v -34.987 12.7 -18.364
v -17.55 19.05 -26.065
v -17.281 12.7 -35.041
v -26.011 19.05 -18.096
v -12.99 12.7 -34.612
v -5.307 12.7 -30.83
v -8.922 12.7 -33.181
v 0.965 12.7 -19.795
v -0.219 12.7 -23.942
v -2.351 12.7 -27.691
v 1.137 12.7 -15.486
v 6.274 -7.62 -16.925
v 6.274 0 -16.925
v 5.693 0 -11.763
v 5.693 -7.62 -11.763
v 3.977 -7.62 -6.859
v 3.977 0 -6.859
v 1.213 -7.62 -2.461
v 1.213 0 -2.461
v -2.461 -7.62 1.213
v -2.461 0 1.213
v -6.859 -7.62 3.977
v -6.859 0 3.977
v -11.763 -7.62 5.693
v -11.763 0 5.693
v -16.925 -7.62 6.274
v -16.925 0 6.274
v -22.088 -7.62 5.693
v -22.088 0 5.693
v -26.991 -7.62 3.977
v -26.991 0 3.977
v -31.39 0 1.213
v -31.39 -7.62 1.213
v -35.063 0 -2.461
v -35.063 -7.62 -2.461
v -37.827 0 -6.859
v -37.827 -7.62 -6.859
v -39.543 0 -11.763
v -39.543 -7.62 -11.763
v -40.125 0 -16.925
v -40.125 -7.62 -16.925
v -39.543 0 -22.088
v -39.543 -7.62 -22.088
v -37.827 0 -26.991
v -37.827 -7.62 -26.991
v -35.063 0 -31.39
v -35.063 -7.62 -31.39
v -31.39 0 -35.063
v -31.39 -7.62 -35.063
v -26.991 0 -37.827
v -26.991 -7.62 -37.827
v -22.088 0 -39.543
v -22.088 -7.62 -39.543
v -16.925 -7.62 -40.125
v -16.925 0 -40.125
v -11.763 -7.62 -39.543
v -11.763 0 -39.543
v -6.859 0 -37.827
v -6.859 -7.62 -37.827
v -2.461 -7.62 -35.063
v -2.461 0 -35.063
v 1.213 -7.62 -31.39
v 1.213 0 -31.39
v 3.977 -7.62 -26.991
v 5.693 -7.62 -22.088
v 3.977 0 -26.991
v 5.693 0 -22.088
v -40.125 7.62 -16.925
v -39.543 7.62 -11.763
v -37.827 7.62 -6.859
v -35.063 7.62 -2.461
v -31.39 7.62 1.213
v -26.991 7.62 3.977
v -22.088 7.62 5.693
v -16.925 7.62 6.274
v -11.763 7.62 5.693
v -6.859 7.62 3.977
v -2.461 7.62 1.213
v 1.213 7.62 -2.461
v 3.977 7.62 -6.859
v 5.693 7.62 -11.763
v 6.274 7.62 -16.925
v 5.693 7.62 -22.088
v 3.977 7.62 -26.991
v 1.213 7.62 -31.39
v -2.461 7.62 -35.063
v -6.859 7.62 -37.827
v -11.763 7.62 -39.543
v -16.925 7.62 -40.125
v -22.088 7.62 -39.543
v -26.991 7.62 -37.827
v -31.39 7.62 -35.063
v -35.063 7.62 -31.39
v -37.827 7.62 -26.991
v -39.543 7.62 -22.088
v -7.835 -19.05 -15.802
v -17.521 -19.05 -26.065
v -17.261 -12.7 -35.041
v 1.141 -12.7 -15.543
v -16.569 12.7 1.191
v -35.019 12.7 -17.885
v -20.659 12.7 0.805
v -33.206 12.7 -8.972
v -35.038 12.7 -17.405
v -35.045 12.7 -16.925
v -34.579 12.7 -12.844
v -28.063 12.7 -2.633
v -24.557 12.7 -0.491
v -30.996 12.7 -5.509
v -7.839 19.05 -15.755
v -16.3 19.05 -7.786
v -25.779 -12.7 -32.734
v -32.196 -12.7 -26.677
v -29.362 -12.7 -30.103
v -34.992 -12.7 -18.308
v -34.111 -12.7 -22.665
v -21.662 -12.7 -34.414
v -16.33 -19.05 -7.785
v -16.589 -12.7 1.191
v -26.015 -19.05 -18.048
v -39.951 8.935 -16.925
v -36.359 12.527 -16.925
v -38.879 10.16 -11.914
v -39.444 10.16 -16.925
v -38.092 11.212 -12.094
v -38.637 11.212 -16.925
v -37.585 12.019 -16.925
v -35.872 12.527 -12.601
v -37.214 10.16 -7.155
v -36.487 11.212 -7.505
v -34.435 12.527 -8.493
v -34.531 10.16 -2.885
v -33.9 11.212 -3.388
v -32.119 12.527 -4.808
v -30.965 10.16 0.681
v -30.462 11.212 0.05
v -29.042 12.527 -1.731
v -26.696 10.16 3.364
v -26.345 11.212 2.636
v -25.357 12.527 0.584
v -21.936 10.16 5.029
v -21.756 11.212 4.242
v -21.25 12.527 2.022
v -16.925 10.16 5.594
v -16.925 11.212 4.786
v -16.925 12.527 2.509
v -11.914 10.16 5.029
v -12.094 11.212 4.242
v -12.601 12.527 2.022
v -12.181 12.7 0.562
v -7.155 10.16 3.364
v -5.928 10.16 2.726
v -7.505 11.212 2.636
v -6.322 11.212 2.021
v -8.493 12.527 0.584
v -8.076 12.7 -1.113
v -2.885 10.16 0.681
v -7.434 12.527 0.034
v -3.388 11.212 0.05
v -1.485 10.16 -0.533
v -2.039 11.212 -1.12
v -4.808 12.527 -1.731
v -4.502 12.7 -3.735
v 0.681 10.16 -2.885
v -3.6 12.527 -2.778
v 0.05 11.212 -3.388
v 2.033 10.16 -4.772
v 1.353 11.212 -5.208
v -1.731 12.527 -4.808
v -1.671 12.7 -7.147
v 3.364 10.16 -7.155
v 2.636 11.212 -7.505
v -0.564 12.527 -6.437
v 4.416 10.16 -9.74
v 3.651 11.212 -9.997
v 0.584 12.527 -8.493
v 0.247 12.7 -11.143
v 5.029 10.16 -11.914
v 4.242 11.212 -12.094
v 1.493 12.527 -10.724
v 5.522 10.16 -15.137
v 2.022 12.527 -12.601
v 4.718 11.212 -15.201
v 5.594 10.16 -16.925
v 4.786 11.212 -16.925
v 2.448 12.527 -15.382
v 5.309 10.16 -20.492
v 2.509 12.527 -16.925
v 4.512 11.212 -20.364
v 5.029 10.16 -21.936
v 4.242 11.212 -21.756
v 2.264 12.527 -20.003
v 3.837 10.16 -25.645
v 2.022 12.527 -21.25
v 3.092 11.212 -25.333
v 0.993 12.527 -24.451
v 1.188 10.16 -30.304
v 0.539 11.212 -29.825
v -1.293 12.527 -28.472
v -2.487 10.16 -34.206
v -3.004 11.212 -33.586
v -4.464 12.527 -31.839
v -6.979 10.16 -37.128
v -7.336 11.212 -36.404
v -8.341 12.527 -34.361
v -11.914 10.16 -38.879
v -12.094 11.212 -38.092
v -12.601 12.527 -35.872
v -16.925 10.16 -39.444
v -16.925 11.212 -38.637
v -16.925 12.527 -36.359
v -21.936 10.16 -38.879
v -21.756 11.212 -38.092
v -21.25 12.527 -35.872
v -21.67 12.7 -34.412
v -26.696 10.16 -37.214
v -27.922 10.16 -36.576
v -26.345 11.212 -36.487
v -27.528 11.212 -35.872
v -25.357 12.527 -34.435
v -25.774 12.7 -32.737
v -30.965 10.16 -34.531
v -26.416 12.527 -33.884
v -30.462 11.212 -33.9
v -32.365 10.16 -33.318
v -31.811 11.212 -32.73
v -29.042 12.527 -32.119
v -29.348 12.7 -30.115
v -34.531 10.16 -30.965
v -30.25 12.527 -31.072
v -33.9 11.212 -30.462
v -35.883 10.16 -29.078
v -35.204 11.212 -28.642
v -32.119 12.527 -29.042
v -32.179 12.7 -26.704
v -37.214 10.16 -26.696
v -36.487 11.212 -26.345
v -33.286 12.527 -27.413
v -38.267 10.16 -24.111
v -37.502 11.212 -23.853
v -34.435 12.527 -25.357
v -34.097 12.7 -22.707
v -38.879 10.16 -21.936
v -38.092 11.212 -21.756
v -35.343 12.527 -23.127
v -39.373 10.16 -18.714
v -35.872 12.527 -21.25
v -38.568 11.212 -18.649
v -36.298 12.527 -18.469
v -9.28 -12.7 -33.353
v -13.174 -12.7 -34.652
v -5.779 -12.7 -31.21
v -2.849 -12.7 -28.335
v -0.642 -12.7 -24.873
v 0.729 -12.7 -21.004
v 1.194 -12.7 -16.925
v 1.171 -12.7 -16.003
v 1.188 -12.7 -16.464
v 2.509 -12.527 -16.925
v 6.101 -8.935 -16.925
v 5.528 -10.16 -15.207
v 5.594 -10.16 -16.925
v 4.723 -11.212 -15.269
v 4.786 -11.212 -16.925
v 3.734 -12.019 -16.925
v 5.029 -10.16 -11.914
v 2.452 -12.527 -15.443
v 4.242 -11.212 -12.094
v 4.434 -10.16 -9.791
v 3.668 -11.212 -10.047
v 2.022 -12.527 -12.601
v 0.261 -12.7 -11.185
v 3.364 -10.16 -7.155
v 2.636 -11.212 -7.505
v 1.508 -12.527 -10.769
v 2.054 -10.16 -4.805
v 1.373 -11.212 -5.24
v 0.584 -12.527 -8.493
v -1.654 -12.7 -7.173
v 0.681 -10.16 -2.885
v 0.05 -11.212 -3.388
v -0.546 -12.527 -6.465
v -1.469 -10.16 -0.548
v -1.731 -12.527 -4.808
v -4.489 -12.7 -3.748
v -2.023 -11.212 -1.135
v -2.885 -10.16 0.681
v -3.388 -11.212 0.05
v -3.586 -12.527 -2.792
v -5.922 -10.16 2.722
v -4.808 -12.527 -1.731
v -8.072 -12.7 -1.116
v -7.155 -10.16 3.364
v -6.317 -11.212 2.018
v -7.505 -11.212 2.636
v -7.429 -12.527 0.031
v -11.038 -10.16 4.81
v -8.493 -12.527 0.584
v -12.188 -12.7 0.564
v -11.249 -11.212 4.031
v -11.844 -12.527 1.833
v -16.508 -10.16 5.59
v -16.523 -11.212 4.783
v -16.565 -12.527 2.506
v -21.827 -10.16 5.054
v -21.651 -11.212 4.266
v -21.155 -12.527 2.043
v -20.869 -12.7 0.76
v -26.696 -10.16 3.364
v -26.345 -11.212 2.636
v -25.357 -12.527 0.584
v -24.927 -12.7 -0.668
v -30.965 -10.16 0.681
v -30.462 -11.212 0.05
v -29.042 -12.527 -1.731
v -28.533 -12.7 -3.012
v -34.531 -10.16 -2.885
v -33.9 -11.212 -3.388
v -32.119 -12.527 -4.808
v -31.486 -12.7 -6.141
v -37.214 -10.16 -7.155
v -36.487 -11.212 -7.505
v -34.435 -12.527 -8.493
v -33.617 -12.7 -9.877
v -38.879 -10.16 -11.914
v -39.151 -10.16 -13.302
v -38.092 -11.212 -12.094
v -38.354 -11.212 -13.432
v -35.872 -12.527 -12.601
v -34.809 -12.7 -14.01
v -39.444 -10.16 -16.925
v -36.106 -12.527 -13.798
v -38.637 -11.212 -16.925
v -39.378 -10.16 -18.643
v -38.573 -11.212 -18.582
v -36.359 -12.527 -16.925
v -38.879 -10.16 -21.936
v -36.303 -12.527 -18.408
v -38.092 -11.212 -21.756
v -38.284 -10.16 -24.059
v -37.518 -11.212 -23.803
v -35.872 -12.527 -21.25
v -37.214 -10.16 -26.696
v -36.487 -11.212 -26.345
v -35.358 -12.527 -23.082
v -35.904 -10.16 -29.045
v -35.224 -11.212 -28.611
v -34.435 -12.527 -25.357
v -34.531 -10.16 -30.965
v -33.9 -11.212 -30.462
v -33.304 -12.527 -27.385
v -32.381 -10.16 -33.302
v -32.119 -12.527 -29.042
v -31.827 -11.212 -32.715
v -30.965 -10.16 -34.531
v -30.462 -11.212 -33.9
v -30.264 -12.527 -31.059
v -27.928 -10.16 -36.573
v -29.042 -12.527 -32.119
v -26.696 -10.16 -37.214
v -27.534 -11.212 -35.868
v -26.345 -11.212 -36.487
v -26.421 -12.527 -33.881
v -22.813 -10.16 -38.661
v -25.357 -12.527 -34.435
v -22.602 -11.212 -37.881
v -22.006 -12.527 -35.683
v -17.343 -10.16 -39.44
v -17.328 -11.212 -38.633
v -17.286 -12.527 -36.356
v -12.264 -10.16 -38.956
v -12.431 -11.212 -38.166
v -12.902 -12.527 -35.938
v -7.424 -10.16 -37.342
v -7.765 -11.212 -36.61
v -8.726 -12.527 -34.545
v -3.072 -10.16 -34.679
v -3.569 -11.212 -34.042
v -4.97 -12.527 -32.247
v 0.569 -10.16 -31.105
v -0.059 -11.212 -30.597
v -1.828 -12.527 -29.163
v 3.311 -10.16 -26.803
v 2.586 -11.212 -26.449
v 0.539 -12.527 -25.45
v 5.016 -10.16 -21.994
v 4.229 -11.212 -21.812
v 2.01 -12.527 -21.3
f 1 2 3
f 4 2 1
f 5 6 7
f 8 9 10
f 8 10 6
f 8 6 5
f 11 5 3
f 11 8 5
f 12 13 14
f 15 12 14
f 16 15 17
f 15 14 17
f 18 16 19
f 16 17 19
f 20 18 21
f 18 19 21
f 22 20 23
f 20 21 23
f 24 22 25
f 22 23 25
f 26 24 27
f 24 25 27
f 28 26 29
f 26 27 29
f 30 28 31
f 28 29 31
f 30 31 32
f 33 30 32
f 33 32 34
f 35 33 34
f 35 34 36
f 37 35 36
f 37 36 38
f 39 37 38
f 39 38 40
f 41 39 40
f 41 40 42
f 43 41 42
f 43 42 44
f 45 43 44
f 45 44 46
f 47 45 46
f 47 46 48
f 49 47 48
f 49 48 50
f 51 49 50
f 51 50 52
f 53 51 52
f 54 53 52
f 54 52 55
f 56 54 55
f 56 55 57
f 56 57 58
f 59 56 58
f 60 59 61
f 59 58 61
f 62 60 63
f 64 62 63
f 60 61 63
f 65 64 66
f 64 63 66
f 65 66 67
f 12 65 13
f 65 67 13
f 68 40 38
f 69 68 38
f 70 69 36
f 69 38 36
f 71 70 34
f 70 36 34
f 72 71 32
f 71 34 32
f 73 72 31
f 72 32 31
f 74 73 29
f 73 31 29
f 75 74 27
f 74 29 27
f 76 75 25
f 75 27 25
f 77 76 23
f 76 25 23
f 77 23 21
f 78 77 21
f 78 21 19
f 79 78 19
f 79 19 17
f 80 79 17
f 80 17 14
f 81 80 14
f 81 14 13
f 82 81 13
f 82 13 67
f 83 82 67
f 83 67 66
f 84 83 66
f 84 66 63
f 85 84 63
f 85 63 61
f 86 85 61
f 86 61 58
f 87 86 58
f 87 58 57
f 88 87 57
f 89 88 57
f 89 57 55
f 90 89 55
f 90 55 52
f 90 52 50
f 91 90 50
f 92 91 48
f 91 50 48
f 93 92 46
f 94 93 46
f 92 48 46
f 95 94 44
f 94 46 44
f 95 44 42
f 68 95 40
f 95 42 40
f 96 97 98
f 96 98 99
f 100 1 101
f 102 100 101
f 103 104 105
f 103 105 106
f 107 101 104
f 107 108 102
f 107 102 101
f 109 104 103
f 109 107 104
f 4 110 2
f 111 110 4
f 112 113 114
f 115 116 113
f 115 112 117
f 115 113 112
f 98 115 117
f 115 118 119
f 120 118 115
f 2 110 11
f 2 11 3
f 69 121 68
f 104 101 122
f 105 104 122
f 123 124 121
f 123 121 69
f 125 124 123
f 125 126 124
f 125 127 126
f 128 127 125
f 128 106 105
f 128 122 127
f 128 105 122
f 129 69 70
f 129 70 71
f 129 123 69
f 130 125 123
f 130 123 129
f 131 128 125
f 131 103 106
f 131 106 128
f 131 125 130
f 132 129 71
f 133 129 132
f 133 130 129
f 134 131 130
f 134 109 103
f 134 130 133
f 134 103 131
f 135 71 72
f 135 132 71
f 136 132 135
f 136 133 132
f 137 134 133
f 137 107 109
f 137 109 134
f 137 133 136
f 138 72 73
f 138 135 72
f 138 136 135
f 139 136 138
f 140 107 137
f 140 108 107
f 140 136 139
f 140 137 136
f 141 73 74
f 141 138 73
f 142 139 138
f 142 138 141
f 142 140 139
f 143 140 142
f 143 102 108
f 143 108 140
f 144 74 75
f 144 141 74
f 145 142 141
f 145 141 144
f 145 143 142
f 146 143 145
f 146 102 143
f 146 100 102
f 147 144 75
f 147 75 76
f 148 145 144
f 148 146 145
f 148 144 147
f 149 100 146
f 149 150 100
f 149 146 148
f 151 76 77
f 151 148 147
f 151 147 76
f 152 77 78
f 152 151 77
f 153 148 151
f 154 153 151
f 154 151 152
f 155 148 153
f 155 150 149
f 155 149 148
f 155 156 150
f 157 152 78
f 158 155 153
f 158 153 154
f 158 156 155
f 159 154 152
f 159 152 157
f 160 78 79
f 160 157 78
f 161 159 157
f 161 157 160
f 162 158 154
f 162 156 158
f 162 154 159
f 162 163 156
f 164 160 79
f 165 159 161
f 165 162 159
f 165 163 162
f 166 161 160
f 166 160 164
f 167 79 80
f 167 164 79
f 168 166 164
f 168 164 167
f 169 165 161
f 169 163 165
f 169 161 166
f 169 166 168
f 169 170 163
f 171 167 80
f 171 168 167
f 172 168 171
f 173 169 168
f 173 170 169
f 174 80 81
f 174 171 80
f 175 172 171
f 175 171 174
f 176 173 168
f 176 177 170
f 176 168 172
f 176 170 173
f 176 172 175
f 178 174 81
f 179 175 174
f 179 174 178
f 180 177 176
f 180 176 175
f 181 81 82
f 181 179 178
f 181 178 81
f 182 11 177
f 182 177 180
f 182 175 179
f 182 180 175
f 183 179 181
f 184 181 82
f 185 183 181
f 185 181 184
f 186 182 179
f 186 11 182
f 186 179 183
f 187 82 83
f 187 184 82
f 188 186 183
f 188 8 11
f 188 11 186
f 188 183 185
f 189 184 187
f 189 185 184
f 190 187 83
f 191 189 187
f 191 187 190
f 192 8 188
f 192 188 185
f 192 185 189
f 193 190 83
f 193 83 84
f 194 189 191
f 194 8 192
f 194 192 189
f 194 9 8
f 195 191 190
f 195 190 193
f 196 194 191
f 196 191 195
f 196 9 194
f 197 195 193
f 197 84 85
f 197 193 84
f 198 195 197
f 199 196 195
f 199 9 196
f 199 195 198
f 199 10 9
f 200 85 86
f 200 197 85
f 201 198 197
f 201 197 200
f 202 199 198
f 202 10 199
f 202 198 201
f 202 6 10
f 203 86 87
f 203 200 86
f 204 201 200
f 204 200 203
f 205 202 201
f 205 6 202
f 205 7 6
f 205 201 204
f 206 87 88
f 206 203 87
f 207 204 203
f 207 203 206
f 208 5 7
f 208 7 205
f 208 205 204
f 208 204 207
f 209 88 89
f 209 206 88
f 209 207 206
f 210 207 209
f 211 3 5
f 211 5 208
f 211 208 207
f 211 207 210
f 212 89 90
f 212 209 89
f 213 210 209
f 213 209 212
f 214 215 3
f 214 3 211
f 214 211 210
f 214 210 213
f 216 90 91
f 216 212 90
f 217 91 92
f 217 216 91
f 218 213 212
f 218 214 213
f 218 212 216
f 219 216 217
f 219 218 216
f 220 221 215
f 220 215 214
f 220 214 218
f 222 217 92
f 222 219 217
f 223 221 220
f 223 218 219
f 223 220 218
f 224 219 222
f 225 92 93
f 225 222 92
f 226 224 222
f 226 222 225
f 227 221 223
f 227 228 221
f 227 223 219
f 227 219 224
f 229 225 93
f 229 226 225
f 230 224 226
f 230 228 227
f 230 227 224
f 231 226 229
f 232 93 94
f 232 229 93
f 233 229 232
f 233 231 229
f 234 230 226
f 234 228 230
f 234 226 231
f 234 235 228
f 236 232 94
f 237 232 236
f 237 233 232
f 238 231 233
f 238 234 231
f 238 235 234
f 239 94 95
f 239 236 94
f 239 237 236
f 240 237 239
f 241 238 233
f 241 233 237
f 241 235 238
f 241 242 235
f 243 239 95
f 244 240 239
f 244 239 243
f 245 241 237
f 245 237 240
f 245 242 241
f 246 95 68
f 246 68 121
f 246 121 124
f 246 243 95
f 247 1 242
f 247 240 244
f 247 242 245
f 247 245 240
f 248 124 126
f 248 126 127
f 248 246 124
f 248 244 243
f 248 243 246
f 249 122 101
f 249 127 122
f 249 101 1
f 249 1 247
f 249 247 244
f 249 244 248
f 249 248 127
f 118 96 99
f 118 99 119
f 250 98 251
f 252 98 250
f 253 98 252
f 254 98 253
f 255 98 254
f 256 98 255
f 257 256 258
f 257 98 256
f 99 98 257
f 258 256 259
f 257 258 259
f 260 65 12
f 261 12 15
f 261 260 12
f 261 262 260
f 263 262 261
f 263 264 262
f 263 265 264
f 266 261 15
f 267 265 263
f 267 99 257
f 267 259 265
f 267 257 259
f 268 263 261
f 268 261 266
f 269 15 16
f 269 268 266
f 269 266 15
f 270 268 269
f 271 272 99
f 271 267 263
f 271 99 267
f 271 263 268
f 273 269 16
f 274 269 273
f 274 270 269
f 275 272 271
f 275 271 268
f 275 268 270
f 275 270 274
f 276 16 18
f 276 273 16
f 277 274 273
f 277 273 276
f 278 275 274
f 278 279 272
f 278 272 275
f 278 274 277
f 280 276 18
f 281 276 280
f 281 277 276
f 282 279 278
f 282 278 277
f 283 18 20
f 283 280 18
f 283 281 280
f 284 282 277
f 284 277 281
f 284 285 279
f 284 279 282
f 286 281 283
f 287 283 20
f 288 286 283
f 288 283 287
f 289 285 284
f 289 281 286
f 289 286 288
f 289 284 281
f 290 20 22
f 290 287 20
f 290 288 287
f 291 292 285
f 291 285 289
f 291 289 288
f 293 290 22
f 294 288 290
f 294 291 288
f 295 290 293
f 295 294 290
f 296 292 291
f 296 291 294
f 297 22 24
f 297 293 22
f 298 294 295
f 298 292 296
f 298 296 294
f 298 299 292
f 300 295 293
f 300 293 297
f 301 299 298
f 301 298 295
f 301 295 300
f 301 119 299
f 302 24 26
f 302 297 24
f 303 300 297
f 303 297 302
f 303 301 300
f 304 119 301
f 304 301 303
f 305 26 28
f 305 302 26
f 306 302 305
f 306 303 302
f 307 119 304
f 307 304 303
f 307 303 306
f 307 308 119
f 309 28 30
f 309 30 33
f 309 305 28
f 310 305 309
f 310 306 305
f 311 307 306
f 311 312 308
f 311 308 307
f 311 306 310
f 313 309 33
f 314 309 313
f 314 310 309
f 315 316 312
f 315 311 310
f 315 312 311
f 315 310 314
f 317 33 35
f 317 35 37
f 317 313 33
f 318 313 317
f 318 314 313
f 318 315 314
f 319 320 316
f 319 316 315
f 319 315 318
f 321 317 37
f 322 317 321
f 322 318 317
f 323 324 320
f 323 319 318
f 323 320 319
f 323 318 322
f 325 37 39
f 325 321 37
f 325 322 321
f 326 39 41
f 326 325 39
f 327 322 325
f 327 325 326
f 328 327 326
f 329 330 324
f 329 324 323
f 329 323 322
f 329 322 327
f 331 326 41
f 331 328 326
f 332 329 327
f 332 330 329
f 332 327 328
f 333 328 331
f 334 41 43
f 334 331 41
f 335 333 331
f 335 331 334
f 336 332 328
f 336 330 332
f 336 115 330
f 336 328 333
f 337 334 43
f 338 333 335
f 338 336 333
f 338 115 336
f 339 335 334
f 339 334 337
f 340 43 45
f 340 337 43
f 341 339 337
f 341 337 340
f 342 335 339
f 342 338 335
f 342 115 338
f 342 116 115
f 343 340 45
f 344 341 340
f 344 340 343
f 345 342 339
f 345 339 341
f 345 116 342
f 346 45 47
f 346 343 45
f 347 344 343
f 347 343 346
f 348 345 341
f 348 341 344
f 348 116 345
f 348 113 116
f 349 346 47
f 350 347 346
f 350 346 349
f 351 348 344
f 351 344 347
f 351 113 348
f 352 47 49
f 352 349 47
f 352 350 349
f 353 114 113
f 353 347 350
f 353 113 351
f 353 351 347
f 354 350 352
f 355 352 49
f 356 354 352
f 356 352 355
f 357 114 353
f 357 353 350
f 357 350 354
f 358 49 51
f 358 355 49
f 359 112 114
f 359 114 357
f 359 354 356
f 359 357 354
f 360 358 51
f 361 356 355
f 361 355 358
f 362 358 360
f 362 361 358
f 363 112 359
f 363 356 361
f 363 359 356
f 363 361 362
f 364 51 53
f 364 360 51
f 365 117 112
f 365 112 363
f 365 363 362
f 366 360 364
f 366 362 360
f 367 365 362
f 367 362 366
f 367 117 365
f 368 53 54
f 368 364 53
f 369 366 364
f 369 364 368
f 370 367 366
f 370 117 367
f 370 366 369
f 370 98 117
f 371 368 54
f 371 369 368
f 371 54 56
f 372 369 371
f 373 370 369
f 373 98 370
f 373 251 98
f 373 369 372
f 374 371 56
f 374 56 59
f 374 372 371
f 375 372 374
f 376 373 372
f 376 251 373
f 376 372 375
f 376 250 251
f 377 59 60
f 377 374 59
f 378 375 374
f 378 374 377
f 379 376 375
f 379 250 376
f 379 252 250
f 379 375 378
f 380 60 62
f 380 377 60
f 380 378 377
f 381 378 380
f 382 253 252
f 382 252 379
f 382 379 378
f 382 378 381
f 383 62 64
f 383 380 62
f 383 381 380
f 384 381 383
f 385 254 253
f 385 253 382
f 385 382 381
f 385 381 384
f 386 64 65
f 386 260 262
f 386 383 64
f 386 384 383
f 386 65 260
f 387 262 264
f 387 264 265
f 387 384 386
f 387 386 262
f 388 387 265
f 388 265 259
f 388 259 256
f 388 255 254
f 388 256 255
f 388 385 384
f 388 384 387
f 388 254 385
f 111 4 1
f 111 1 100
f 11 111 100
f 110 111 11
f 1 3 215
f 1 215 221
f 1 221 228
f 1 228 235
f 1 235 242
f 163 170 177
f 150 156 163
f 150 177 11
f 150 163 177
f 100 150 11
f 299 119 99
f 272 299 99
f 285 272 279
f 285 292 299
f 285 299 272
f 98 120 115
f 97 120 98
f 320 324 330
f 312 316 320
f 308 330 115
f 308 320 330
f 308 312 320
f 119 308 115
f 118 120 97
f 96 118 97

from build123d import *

# Parameters (mm, degrees)
F0_R     = 23.1993727041
F1_DEPTH = 12.7
F2_R     = 23.1993727041
F3_DEPTH = 12.7
F4_R     = 5.08
F7_DEPTH = 6.35
F8_DEPTH = 6.35
F9_SIZE  = 6.34999
F10_SIZE = 6.34999


# Not quite as in the source:
# - a fillet or chamfer is up to 0.001 mm smaller than in the source, because OpenCascade refuses the exact size


with BuildPart() as f1:
    # F0 (on Front) → F1 (new body)
    with BuildSketch(Plane.XZ):
        with Locations((-16.9251933694, -16.9251933694)):
            Circle(F0_R)
    extrude(amount=F1_DEPTH)

    # F2 (on face) → F3 (join)
    with BuildSketch(Plane(origin=(0, 0, 0), x_dir=(-1, 0, 0), z_dir=(0, 1, 0))):
        with Locations((16.9251933694, -16.9251933694)):
            Circle(F2_R)
    extrude(amount=F3_DEPTH)

    # F4
    f4_edges = [f1.edges().sort_by_distance(p)[0] for p in [
        (6.274179, 12.7, -16.925193),
        (-16.925193, 0, 6.274179),
        (-16.925193, 0, -40.124566),
        (6.274179, -6.35, -16.925193),
        (-40.124566, -12.7, -16.925193),
        (-40.124566, 6.35, -16.925193),
    ]]
    fillet(f4_edges, radius=F4_R)

    # F5 (on face) → F7 (join)
    with BuildSketch(Plane(origin=(0, 12.7, 0), x_dir=(-1, 0, 0), z_dir=(0, 1, 0))):
        Polygon((34.987336153, -18.3641740003), (16.5690030176, 1.1906780042), (-1.1369494142, -15.4862127385), (17.2813837212, -35.041064743), align=None)
    extrude(amount=F7_DEPTH)

    # F6 (on face) → F8 (join)
    with BuildSketch(Plane.XZ.offset(12.7)):
        Polygon((1.1413726115, -15.5428544637), (-16.5892601531, 1.1910649658), (-34.9917593503, -18.3075322751), (-17.2611265857, -35.0414517045), align=None)
    extrude(amount=F8_DEPTH)

    # F9 (size 6.35 in the source; OpenCascade refuses exactly that, so slightly less here)
    f9_edges = [f1.edges().sort_by_distance(p)[0] for p in [
        (-8.072217, 19.05, -25.263639),
        (-26.13436, 19.05, -26.702619),
        (-25.77817, 19.05, -8.586748),
        (-7.716027, 19.05, -7.147767),
    ]]
    chamfer(f9_edges, length=F9_SIZE)

    # F10 (size 6.35 in the source; OpenCascade refuses exactly that, so slightly less here)
    f10_edges = [f1.edges().sort_by_distance(p)[0] for p in [
        (-8.059877, -19.05, -25.292153),
        (-7.723944, -19.05, -7.175895),
        (-25.79051, -19.05, -8.558234),
        (-26.126443, -19.05, -26.674492),
    ]]
    chamfer(f10_edges, length=F10_SIZE)


solid = f1.part
